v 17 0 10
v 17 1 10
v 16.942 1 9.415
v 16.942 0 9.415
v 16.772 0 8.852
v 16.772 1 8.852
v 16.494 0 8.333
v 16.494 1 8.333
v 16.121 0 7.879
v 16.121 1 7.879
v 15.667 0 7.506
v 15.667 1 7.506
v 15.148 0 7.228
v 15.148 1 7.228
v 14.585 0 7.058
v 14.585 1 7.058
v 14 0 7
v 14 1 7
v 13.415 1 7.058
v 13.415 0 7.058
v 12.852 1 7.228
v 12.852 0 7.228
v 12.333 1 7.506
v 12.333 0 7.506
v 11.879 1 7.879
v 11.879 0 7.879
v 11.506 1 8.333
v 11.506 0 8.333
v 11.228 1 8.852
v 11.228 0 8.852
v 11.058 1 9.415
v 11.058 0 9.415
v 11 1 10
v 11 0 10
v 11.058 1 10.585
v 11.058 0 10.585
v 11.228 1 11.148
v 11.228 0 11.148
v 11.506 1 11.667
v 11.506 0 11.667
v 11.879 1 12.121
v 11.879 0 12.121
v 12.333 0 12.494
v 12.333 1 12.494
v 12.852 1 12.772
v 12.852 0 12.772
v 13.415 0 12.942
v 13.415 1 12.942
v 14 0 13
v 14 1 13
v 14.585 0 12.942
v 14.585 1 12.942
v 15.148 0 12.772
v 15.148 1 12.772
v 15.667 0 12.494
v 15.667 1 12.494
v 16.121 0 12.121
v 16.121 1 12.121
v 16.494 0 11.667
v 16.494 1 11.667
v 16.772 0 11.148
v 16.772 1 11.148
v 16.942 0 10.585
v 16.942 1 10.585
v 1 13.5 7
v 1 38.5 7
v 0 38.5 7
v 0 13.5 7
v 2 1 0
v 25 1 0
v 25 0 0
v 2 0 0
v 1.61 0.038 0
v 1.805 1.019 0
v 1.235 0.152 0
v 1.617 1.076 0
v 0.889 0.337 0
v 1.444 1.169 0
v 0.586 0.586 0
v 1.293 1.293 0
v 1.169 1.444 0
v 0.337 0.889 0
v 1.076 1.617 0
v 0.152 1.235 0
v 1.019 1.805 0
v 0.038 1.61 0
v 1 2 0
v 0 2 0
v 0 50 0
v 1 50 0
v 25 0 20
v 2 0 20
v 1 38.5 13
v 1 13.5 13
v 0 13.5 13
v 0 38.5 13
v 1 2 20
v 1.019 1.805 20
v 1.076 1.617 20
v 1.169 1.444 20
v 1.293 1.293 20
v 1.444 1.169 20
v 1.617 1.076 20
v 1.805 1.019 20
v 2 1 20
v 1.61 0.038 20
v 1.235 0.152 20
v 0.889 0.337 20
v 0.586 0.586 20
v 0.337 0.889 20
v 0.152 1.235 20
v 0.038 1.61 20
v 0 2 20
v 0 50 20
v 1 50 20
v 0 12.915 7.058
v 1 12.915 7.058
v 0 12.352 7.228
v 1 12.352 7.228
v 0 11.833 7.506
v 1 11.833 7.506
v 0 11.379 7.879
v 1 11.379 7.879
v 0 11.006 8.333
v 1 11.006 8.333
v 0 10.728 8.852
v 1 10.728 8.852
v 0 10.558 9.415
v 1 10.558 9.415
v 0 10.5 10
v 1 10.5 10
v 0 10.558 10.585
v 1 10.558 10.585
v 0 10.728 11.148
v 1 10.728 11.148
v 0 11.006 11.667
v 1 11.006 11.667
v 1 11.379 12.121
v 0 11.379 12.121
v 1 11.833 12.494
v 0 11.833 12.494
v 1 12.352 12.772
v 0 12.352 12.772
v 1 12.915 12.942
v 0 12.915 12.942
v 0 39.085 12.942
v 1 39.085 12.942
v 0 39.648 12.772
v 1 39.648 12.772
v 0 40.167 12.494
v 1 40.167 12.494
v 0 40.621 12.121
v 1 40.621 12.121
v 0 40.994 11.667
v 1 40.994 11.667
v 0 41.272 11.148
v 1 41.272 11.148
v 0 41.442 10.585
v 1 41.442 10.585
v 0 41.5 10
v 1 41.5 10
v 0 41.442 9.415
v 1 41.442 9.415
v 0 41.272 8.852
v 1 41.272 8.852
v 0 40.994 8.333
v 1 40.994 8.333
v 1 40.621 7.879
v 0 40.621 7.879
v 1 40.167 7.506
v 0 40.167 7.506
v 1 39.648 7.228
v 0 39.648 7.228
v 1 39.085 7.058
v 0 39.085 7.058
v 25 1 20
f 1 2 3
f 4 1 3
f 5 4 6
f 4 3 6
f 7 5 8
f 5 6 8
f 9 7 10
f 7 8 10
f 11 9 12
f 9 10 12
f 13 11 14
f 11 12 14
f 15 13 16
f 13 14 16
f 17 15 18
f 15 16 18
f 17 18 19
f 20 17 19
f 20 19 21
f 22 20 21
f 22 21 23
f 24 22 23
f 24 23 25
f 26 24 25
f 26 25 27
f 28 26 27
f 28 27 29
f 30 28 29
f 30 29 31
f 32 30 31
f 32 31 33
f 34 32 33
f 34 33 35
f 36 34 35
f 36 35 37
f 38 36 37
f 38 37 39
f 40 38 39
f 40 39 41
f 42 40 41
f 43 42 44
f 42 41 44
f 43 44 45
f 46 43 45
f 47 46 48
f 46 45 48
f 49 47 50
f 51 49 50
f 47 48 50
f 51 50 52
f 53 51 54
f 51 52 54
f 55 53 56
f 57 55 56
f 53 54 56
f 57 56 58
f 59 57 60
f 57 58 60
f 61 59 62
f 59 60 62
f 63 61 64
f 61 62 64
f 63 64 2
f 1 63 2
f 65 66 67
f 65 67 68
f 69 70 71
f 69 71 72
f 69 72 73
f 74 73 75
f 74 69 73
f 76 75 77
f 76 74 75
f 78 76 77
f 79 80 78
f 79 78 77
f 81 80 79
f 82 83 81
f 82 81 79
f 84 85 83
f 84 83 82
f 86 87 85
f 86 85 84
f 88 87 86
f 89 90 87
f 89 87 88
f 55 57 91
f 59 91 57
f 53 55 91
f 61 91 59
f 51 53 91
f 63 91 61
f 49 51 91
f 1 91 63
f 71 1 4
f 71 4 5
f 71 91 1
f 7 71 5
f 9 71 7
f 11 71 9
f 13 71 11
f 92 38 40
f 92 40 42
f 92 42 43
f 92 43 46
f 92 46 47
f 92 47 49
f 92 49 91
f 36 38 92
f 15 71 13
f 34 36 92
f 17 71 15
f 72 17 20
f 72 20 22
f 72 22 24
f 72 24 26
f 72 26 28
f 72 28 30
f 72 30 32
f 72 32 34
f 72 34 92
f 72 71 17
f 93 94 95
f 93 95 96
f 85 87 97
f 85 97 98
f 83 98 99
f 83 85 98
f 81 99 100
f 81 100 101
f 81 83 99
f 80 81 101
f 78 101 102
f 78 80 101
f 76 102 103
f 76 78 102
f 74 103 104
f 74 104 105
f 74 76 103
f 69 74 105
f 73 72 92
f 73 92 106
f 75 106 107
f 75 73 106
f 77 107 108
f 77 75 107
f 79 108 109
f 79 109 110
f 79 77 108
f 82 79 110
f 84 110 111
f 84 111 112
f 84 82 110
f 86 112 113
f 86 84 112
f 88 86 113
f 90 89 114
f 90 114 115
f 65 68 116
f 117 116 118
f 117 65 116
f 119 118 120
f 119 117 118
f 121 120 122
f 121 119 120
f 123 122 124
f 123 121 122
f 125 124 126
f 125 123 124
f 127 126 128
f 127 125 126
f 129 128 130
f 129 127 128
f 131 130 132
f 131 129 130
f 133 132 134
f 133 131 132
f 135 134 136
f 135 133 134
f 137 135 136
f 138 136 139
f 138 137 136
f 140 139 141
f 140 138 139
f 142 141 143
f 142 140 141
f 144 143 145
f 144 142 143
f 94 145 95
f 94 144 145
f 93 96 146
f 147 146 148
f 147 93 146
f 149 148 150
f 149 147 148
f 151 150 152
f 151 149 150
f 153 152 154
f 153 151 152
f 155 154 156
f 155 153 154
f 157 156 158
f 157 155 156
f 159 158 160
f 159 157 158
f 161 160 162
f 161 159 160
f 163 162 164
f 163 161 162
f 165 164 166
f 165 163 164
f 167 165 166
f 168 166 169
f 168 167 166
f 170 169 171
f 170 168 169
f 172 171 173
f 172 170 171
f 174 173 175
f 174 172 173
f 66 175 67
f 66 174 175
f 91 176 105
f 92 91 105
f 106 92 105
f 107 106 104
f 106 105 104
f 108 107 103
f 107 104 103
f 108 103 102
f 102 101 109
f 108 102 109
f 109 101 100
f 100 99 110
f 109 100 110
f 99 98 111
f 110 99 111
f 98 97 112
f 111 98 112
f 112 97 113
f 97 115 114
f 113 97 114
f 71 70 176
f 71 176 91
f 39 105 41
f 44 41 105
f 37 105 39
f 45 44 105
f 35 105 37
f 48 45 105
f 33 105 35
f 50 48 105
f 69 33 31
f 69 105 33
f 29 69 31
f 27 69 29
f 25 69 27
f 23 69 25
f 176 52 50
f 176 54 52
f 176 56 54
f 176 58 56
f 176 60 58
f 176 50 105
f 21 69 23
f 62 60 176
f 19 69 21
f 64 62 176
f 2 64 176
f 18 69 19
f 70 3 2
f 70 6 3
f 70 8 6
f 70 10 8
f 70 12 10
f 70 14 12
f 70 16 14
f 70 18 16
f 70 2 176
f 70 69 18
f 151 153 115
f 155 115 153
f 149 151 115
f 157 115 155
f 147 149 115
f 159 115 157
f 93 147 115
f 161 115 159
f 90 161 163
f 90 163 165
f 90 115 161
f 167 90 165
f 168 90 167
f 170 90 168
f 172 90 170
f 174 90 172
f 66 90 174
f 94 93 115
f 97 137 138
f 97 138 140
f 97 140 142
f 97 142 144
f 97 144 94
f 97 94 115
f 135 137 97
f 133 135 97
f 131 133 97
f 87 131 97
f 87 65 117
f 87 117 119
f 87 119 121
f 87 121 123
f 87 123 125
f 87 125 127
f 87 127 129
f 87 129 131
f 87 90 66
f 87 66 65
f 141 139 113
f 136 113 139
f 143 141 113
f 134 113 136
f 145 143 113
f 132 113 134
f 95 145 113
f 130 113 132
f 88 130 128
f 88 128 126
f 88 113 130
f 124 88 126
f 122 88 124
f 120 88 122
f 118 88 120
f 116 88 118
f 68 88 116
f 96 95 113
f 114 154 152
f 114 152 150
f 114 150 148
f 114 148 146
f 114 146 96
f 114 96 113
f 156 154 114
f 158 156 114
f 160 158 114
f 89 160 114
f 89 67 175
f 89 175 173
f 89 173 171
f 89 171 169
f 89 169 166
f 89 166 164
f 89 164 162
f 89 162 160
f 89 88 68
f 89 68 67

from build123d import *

# Parameters (mm, degrees)
BOSS_EXTRUDE1_DEPTH = 20
CUT_EXTRUDE1_DEPTH  = 10
SKETCH4_R           = 3
CUT_EXTRUDE2_DEPTH  = 10


with BuildPart() as part:
    # Sketch2 → Boss-Extrude1 (new body)
    with BuildSketch(Plane.XY):
        with BuildLine():
            Line((0, 2), (0, 50))
            Line((0, 50), (1, 50))
            Line((1, 50), (1, 2))
            ThreePointArc((1, 2), (1.292893219, 1.292893219), (2, 1))
            Line((2, 1), (25, 1))
            Line((25, 1), (25, 0))
            Line((25, 0), (2, 0))
            ThreePointArc((2, 0), (0.585786438, 0.585786438), (0, 2))
        make_face()
    extrude(amount=BOSS_EXTRUDE1_DEPTH)

    # Sketch3 → Cut-Extrude1 (cut)
    with BuildSketch(Plane(origin=(1, 0, 0), x_dir=(0, 0, -1), z_dir=(1, 0, 0))):
        with BuildLine():
            Line((-13, 13.5), (-13, 38.5))
            ThreePointArc((-13, 38.5), (-10, 41.5), (-7, 38.5))
            Line((-7, 38.5), (-7, 13.5))
            ThreePointArc((-7, 13.5), (-10, 10.5), (-13, 13.5))
        make_face()
    extrude(amount=-CUT_EXTRUDE1_DEPTH, mode=Mode.SUBTRACT)

    # Sketch4 → Cut-Extrude2 (cut)
    with BuildSketch(Plane(origin=(0, 1, 0), x_dir=(1, 0, 0), z_dir=(0, 1, 0))):
        with Locations((14, -10)):
            Circle(SKETCH4_R)
    extrude(amount=-CUT_EXTRUDE2_DEPTH, mode=Mode.SUBTRACT)


solid = part.part
